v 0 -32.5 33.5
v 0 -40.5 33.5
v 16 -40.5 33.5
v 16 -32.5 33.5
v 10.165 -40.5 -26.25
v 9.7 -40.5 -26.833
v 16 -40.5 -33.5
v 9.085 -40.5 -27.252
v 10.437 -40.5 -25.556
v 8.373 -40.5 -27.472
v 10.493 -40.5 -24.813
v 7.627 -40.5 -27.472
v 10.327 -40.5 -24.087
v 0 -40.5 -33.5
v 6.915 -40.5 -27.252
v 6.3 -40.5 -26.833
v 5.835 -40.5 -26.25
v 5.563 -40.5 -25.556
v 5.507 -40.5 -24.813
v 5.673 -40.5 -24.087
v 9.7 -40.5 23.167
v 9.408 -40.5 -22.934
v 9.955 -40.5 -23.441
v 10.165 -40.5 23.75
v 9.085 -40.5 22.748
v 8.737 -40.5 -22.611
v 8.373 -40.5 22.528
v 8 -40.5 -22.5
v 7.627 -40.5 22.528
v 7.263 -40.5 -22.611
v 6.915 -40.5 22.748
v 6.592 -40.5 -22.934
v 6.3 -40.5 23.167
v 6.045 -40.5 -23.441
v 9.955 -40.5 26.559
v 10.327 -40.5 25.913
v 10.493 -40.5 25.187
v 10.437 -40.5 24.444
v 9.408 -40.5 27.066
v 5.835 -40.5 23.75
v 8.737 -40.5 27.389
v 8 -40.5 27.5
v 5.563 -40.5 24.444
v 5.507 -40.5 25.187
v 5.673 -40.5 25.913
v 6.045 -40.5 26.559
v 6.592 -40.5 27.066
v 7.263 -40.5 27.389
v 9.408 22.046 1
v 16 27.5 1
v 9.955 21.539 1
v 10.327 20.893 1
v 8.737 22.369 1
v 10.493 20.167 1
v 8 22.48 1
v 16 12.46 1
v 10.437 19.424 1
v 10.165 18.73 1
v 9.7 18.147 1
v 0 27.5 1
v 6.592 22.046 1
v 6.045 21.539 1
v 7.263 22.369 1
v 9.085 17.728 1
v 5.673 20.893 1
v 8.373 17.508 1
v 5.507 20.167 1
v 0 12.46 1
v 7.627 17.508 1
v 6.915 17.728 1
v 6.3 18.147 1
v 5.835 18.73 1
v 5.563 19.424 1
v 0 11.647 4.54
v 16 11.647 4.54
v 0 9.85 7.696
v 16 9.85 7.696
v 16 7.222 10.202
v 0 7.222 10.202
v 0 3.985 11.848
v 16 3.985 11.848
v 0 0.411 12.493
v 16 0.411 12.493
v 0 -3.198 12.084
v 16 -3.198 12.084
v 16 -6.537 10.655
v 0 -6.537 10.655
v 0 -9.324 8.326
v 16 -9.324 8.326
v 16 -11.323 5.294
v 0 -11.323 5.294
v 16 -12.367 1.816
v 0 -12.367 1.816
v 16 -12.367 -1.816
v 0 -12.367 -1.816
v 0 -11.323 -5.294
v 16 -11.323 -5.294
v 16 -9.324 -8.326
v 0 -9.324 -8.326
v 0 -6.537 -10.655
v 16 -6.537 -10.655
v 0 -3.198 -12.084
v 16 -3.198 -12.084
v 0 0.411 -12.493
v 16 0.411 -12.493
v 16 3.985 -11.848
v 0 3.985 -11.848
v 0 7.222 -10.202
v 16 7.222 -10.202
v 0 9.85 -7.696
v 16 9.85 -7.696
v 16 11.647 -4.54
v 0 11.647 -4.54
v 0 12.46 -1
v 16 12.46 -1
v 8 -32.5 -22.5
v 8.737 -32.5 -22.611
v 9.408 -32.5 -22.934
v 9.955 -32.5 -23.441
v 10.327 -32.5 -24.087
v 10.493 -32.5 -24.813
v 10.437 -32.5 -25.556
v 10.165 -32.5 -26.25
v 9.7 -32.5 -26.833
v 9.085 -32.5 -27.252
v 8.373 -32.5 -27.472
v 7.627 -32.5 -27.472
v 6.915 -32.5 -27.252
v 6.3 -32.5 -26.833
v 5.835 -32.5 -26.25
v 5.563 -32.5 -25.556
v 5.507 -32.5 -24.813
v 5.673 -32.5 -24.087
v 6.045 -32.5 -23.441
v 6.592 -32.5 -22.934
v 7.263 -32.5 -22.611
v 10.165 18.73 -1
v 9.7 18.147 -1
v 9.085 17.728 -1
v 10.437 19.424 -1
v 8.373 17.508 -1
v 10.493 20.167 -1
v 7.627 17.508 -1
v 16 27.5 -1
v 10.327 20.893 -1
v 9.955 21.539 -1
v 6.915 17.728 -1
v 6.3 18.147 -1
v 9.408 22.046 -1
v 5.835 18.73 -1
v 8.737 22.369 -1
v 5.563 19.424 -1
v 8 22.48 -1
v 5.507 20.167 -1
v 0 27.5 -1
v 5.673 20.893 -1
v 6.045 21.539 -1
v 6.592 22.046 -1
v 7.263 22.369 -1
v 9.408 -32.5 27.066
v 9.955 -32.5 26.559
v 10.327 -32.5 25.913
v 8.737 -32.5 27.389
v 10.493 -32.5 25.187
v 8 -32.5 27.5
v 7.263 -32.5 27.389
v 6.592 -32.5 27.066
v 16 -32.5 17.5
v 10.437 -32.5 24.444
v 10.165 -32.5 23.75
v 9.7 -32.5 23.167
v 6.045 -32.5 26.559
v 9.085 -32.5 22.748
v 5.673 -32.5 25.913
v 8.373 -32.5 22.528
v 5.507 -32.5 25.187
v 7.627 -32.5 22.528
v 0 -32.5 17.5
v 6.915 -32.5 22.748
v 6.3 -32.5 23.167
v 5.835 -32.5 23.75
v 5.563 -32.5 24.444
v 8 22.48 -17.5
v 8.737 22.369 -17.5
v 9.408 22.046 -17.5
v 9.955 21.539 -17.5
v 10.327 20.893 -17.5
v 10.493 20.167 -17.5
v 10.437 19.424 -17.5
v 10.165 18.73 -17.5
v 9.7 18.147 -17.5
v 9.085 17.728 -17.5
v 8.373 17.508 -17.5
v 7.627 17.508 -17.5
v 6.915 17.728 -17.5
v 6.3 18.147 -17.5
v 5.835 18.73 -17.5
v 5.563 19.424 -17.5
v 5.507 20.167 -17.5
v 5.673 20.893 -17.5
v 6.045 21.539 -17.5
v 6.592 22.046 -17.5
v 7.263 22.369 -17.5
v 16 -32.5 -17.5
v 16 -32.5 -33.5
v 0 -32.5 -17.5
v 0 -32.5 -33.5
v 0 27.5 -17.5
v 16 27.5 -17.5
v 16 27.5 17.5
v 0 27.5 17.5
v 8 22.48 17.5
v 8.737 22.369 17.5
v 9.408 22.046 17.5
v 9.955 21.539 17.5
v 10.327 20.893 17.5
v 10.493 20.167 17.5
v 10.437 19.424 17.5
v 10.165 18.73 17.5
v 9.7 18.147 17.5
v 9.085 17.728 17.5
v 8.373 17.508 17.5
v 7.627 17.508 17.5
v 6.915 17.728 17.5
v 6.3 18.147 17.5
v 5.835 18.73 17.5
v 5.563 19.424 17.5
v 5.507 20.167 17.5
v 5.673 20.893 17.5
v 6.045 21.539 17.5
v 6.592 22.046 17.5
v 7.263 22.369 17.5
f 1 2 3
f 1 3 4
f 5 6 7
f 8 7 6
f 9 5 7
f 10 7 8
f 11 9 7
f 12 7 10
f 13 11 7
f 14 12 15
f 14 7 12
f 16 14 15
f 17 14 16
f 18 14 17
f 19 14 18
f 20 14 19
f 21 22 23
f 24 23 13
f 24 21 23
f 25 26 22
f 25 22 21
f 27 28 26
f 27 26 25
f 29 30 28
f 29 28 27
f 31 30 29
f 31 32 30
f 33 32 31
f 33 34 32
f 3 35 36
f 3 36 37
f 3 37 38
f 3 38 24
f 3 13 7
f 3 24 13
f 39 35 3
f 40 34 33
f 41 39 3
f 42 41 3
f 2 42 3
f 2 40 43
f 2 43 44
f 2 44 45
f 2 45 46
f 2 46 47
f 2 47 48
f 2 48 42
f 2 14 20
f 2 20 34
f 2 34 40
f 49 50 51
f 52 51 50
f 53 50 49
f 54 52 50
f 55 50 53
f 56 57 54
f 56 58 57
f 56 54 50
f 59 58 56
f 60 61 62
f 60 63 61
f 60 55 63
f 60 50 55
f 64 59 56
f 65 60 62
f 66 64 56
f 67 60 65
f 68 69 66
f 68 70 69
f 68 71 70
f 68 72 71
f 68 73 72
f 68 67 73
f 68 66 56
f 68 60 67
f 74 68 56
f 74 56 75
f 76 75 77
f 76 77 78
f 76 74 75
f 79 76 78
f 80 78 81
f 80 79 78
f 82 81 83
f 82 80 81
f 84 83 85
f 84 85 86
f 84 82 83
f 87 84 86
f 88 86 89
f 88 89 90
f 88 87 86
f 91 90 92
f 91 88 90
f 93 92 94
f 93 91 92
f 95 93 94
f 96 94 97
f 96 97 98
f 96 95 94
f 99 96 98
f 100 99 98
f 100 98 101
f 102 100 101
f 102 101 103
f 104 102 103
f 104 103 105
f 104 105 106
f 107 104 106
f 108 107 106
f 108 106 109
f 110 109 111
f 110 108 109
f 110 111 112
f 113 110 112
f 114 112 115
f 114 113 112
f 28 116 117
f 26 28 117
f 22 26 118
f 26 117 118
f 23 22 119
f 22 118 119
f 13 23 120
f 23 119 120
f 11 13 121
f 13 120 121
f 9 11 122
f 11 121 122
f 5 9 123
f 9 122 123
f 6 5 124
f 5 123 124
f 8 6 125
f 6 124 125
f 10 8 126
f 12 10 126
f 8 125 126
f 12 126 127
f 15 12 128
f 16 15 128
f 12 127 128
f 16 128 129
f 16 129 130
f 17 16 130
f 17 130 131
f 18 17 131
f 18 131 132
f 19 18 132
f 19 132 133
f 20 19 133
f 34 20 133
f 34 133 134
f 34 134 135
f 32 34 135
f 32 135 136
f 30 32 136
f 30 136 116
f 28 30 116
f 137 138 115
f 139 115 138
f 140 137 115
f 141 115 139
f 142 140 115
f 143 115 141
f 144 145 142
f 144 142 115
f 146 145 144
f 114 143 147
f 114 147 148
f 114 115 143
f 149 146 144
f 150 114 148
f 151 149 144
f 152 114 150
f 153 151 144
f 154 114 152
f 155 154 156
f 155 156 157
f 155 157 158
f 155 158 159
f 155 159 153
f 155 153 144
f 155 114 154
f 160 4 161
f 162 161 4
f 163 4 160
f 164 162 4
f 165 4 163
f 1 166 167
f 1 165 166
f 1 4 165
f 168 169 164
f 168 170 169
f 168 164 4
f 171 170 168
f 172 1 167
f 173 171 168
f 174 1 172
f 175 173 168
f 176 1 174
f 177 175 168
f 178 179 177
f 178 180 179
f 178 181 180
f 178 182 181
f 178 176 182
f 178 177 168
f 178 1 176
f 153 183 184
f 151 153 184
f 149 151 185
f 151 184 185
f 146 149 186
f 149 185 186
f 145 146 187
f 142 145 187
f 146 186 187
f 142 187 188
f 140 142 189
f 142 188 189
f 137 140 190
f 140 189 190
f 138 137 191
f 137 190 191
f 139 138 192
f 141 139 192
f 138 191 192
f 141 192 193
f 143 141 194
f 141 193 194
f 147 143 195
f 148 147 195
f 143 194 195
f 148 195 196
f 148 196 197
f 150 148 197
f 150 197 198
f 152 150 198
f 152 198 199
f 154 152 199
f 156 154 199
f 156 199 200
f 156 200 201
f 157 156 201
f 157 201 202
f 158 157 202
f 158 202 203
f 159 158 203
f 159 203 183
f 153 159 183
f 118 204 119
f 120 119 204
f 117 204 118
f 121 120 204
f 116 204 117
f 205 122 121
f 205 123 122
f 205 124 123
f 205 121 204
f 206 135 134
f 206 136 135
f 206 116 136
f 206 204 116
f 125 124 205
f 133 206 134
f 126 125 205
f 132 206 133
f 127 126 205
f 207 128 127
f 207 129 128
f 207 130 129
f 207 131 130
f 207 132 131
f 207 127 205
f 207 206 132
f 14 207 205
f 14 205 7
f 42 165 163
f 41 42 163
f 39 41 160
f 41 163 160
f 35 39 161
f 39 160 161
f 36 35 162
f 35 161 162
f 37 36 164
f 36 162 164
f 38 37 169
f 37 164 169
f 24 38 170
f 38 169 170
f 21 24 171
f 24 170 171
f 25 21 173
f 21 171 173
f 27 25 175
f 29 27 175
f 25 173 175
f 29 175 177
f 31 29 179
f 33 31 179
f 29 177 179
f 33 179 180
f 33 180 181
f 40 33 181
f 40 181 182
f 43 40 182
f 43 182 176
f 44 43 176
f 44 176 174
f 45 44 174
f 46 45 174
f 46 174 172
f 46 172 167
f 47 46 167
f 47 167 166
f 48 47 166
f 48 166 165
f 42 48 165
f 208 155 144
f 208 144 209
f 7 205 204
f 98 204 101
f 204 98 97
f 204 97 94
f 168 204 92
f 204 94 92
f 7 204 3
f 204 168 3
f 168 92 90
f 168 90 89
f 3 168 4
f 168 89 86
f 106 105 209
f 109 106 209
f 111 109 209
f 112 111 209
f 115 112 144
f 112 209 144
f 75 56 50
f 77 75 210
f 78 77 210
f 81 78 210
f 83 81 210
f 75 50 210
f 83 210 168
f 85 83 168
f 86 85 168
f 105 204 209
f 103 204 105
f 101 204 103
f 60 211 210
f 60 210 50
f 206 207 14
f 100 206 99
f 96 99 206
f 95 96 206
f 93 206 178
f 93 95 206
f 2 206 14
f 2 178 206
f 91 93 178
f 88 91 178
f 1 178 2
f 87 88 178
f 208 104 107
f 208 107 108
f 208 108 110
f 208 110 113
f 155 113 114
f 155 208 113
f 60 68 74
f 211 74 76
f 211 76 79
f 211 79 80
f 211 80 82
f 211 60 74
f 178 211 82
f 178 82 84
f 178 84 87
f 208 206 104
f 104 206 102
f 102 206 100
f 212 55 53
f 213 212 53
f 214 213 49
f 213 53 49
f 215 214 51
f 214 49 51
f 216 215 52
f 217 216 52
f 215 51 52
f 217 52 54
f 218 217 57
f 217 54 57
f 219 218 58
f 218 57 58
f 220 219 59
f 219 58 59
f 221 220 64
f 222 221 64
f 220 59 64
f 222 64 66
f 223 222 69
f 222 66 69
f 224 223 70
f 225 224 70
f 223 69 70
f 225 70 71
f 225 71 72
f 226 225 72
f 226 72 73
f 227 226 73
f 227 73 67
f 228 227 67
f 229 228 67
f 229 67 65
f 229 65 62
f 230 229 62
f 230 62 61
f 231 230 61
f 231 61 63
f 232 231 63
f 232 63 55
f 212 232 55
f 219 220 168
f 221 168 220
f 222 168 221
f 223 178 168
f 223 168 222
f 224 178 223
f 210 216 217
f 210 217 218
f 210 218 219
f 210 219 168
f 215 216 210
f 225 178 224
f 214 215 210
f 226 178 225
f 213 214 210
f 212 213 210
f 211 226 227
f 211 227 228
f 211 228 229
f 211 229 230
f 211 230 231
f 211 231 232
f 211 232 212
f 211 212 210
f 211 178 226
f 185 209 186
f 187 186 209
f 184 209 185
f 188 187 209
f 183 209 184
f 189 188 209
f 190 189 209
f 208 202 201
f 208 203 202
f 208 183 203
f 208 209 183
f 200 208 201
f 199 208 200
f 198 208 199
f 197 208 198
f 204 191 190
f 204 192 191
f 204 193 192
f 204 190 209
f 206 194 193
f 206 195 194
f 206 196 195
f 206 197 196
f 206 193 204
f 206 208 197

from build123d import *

# Parameters (mm, degrees)
BOSS_EXTRUDE1_DEPTH = 16
SKETCH2_R           = 2.5
CUT_EXTRUDE1_DEPTH  = 71.556714776
SKETCH3_R           = 2.5
CUT_EXTRUDE2_DEPTH  = 68.061538903


with BuildPart() as part:
    # Sketch1 → Boss-Extrude1 (new body)
    with BuildSketch(Plane(origin=(0, 0, 0), x_dir=(0, 0, -1), z_dir=(1, 0, 0))):
        with BuildLine():
            Line((17.5, -32.5), (33.5, -32.5))
            Line((33.5, -32.5), (33.5, -40.5))
            Line((33.5, -40.5), (-33.5, -40.5))
            Line((-33.5, -40.5), (-33.5, -32.5))
            Line((-33.5, -32.5), (-17.5, -32.5))
            Line((-17.5, -32.5), (-17.5, 27.5))
            Line((-17.5, 27.5), (-1, 27.5))
            Line((-1, 27.5), (-1, 12.459935794))
            ThreePointArc((-1, 12.459935794), (0, -12.5), (1, 12.459935794))
            Line((1, 12.459935794), (1, 27.5))
            Line((1, 27.5), (17.5, 27.5))
            Line((17.5, 27.5), (17.5, -32.5))
        make_face()
    extrude(amount=BOSS_EXTRUDE1_DEPTH)

    # Sketch2 → Cut-Extrude1 (cut, through all)
    with BuildSketch(Plane(origin=(0, -32.5, 0), x_dir=(1, 0, 0), z_dir=(0, 1, 0))):
        with Locations((8, -25)):
            Circle(SKETCH2_R)
        with Locations((8, 25)):
            Circle(SKETCH2_R)
    extrude(amount=-CUT_EXTRUDE1_DEPTH, mode=Mode.SUBTRACT)

    # Sketch3 → Cut-Extrude2 (cut, through all)
    with BuildSketch(Plane(origin=(0, 0, -17.5), x_dir=(-1, 0, 0), z_dir=(0, 0, -1))):
        with Locations((-8, 19.979967897)):
            Circle(SKETCH3_R)
    extrude(amount=-CUT_EXTRUDE2_DEPTH, mode=Mode.SUBTRACT)


solid = part.part
